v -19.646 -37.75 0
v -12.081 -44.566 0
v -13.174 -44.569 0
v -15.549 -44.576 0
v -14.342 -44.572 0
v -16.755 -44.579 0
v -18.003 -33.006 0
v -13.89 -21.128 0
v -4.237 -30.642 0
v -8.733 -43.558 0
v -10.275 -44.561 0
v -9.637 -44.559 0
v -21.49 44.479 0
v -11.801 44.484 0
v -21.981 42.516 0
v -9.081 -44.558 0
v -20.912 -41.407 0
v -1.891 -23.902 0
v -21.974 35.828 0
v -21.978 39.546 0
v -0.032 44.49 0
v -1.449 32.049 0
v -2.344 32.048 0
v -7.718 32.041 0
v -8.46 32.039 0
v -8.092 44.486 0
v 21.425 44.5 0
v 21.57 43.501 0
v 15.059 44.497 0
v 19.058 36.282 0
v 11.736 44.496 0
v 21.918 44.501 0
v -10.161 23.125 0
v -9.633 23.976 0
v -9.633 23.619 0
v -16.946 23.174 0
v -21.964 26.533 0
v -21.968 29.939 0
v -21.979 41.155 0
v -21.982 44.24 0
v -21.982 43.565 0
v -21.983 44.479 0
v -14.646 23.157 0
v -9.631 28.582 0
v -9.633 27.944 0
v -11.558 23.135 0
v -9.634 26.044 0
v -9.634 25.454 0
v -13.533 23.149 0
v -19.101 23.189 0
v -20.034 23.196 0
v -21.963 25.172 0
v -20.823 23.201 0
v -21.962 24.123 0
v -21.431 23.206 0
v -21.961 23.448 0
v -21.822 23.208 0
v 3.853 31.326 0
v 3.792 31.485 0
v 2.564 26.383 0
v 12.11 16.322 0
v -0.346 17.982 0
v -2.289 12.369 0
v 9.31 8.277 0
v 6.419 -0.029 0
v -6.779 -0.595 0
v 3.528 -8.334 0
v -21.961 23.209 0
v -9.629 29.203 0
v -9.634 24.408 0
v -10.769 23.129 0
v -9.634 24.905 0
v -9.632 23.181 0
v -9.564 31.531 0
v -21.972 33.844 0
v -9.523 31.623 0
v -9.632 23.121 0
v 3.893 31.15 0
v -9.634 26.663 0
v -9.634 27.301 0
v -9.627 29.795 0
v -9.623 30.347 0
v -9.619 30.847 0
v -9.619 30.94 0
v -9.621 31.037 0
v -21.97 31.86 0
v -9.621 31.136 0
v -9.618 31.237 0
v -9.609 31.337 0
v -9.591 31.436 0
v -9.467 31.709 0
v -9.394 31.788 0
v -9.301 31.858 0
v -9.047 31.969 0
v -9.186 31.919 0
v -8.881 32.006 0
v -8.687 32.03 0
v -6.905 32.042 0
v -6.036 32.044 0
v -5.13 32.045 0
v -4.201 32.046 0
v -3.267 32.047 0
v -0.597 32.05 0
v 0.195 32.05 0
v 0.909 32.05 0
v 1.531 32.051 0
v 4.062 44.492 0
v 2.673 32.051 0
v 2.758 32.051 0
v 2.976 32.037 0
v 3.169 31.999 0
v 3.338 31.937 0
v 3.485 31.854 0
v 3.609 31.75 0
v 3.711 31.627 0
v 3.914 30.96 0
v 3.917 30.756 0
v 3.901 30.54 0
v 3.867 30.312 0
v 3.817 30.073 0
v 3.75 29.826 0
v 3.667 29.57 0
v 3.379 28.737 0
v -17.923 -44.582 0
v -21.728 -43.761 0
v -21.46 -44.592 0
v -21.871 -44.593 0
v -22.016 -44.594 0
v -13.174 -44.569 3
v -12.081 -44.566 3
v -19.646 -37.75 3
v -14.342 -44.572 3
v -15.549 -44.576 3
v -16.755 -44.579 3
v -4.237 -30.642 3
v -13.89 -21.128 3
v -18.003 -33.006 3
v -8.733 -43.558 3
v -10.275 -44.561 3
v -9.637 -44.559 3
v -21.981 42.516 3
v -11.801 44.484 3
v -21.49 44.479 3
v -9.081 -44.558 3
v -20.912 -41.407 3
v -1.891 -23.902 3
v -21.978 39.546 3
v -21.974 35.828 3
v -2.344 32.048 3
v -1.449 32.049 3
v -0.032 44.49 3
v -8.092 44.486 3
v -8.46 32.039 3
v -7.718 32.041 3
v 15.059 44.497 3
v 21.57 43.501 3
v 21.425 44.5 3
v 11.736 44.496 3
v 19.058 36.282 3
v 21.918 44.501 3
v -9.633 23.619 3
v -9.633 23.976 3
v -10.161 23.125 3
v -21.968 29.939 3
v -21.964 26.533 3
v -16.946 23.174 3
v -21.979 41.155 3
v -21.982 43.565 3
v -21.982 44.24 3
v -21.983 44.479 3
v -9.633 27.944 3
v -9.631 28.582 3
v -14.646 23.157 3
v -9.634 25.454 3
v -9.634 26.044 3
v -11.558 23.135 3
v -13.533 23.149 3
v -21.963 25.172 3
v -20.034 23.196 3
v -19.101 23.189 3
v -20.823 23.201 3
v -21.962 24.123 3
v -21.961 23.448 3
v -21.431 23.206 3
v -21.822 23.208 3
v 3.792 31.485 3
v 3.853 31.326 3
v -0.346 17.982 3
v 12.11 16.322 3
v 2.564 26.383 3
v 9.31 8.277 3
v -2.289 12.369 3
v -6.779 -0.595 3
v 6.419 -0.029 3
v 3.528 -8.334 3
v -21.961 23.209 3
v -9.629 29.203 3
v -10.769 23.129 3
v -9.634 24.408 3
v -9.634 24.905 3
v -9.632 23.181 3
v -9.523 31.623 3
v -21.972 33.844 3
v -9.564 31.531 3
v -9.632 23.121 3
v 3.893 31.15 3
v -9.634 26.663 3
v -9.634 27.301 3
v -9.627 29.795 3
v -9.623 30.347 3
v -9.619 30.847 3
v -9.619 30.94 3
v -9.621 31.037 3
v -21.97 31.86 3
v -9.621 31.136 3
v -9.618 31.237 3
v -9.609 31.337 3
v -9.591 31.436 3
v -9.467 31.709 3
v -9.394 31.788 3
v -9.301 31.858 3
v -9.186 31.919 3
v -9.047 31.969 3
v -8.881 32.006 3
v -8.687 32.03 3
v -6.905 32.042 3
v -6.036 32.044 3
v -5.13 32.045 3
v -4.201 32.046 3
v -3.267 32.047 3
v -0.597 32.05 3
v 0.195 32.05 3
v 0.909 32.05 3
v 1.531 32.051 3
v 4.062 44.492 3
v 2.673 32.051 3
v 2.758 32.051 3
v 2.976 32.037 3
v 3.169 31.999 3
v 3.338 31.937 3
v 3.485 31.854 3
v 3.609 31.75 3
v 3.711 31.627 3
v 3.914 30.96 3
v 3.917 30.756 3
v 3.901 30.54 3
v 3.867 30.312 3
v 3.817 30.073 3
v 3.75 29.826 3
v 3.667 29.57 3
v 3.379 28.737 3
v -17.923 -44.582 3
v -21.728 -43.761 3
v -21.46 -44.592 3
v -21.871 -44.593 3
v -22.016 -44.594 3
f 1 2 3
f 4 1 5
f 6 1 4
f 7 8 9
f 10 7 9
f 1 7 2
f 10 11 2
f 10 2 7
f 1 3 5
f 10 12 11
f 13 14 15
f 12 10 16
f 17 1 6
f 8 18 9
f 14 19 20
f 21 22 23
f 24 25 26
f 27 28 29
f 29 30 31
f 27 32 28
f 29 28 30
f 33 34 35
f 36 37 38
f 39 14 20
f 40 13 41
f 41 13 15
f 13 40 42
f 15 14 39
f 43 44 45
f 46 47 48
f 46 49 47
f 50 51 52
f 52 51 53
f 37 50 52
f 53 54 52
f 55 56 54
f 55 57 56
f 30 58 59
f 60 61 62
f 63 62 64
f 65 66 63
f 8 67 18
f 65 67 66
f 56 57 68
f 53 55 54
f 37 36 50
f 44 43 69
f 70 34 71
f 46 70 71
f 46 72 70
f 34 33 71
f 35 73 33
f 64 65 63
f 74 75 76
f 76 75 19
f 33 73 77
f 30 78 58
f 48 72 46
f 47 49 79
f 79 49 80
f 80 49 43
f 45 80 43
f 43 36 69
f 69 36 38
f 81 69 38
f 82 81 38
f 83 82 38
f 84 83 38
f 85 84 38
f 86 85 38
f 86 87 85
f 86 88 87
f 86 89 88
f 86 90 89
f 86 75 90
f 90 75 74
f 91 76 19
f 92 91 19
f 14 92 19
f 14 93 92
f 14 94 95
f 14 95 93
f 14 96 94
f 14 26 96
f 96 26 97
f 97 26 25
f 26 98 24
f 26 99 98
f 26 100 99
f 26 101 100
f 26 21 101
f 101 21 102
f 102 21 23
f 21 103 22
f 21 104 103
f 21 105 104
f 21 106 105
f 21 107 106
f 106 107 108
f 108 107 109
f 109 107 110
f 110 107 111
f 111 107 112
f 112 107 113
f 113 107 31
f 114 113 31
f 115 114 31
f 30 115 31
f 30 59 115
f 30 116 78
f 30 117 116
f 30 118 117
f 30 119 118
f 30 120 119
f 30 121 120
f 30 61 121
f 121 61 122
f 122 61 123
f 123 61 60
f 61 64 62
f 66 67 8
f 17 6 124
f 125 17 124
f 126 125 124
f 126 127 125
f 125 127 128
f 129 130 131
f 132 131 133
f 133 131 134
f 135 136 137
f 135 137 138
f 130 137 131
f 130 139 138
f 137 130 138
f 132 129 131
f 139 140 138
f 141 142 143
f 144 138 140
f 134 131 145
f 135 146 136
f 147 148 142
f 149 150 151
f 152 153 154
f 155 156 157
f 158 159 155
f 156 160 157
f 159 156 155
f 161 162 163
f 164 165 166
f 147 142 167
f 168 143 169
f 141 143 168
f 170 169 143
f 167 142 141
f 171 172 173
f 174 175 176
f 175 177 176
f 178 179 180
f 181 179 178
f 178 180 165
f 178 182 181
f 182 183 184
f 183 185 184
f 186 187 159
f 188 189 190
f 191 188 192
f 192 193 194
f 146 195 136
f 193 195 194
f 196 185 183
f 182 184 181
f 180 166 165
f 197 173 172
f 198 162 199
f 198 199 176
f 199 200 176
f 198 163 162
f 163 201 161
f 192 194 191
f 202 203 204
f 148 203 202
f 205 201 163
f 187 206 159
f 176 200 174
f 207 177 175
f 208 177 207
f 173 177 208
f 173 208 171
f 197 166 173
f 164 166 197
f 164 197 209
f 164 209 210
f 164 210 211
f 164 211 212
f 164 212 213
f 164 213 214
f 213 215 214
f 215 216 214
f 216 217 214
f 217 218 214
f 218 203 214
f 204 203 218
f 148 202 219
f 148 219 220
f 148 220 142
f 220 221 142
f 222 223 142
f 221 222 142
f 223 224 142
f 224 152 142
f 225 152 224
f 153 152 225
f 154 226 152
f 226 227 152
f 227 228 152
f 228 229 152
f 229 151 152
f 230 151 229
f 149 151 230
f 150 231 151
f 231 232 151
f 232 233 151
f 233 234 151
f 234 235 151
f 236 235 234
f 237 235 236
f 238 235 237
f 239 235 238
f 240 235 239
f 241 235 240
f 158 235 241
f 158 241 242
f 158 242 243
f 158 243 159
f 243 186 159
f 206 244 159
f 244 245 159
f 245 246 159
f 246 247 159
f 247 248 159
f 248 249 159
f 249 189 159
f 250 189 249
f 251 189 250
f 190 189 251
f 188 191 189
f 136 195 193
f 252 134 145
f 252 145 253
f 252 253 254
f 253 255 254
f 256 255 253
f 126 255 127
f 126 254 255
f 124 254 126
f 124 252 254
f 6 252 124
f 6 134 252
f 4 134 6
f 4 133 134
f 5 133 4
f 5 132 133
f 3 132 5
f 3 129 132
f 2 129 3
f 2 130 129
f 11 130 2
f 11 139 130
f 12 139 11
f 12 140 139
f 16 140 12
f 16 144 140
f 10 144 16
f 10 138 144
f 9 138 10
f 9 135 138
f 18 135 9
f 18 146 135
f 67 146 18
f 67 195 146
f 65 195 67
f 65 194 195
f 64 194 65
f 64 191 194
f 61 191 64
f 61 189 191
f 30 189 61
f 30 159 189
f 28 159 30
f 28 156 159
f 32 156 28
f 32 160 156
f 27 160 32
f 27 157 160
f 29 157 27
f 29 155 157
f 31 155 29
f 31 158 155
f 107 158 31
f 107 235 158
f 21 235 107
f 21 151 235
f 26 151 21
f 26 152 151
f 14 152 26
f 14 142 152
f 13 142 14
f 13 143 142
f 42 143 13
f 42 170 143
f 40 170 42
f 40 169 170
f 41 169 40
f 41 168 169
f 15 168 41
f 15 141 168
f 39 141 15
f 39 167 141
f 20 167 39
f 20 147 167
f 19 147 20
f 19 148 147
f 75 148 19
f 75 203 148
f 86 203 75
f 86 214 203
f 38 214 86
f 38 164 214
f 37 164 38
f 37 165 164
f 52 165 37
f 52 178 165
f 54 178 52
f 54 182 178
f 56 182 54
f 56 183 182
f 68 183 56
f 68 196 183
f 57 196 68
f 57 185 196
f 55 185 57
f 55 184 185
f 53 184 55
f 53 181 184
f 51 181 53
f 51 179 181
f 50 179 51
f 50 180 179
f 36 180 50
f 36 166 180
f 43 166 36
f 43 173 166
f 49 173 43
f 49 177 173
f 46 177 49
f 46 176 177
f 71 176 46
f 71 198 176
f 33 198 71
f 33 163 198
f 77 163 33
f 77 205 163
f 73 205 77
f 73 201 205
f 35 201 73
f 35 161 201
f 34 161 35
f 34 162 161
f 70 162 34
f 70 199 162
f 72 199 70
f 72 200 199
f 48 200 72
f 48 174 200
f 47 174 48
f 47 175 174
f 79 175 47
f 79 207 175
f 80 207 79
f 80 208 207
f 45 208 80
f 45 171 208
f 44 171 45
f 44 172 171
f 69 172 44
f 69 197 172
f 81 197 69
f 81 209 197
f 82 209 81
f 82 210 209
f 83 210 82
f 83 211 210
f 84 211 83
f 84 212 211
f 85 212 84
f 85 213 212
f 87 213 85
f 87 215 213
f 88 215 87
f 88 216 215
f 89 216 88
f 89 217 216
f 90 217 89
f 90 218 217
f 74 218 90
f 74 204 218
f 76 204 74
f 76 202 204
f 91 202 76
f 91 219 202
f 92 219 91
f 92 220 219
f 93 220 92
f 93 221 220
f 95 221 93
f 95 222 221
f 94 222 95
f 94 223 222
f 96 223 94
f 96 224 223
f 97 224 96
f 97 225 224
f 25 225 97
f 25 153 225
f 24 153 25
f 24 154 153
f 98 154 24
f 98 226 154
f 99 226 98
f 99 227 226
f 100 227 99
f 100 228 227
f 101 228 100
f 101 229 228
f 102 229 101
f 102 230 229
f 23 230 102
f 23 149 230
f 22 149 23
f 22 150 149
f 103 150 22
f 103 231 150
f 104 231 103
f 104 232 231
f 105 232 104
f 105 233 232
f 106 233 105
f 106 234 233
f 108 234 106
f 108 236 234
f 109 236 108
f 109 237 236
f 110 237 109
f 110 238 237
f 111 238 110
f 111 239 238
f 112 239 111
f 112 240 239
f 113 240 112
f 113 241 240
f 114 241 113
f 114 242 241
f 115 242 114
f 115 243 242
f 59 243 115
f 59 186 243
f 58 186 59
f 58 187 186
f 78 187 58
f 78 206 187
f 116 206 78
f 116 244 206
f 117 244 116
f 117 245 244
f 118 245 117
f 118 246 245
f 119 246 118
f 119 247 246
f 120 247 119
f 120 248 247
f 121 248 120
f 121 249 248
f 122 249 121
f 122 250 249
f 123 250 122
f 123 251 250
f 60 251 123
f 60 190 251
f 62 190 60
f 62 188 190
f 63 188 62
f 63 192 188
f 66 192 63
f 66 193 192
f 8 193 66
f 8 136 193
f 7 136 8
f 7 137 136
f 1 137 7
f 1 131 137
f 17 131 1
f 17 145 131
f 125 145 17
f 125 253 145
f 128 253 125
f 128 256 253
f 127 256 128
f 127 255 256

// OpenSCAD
// Generated from 交通部公路局（原交通部公路總局）「新式號牌使用之英文字、數字字體」author trace
fudge = 0.1;

module glyph_2012_7(h = 3) {
  difference() {
    linear_extrude(height = h)
      polygon(points = [[-21.9828, 44.4788], [-21.9825, 44.2399], [-21.9818, 43.5649], [-21.9808, 42.5159], [-21.9793, 41.1554], [-21.9777, 39.5457], [-21.9758, 37.749], [-21.9738, 35.8277], [-21.9718, 33.8441], [-21.9697, 31.8604], [-21.9678, 29.9391], [-21.9659, 28.1424], [-21.9642, 26.5327], [-21.9628, 25.1722], [-21.9618, 24.1233], [-21.9611, 23.4482], [-21.9608, 23.2093], [-21.8223, 23.2083], [-21.431, 23.2056], [-20.823, 23.2012], [-20.0344, 23.1956], [-19.1013, 23.1889], [-18.0598, 23.1815], [-16.9461, 23.1736], [-15.7962, 23.1654], [-14.6464, 23.1572], [-13.5327, 23.1492], [-12.4912, 23.1418], [-11.5581, 23.1352], [-10.7694, 23.1295], [-10.1614, 23.1252], [-9.7701, 23.1224], [-9.6316, 23.1214], [-9.6318, 23.1806], [-9.6321, 23.3505], [-9.6326, 23.6195], [-9.6331, 23.976], [-9.6336, 24.4082], [-9.6341, 24.9047], [-9.6344, 25.4538], [-9.6345, 26.044], [-9.6343, 26.6635], [-9.6337, 27.3007], [-9.6327, 27.9442], [-9.6313, 28.5821], [-9.6293, 29.203], [-9.6266, 29.7952], [-9.6232, 30.3472], [-9.6191, 30.8471], [-9.6195, 30.9402], [-9.621, 31.037], [-9.6213, 31.1363], [-9.618, 31.2368], [-9.6088, 31.337], [-9.5915, 31.4357], [-9.5637, 31.5314], [-9.523, 31.6229], [-9.4673, 31.7088], [-9.3942, 31.7876], [-9.3014, 31.8582], [-9.1865, 31.9191], [-9.0473, 31.9689], [-8.8814, 32.0064], [-8.6866, 32.0301], [-8.4605, 32.0388], [-7.7183, 32.0406], [-6.9048, 32.0423], [-6.0365, 32.0438], [-5.1299, 32.0451], [-4.2014, 32.0463], [-3.2674, 32.0473], [-2.3444, 32.0482], [-1.4487, 32.049], [-0.5969, 32.0496], [0.1947, 32.0501], [0.9095, 32.0505], [1.5313, 32.0509], [2.0435, 32.0511], [2.4297, 32.0512], [2.6734, 32.0513], [2.7583, 32.0514], [2.9757, 32.037], [3.1689, 31.9986], [3.3384, 31.9372], [3.4849, 31.854], [3.609, 31.7501], [3.7112, 31.6266], [3.7923, 31.4848], [3.8527, 31.3257], [3.8932, 31.1505], [3.9143, 30.9604], [3.9166, 30.7565], [3.9007, 30.5399], [3.8672, 30.3119], [3.8168, 30.0734], [3.75, 29.8258], [3.6674, 29.57], [3.379, 28.7371], [2.5638, 26.3833], [1.2972, 22.7258], [-0.3456, 17.9819], [-2.2895, 12.3689], [-4.459, 6.1041], [-6.779, -0.5953], [-9.1743, -7.5119], [-11.5696, -14.4286], [-13.8897, -21.128], [-16.0592, -27.3928], [-18.003, -33.0058], [-19.6459, -37.7496], [-20.9125, -41.4071], [-21.7276, -43.761], [-22.0161, -44.5939], [-21.8708, -44.5935], [-21.4603, -44.5923], [-20.8224, -44.5905], [-19.995, -44.5882], [-19.016, -44.5855], [-17.9234, -44.5825], [-16.7549, -44.5792], [-15.5486, -44.5759], [-14.3422, -44.5725], [-13.1738, -44.5693], [-12.0812, -44.5662], [-11.1022, -44.5635], [-10.2748, -44.5612], [-9.6369, -44.5594], [-9.2264, -44.5583], [-9.0811, -44.5579], [-8.733, -43.5577], [-7.7491, -40.7311], [-6.2203, -36.3391], [-4.2374, -30.6425], [-1.8913, -23.9022], [0.7273, -16.3792], [3.5276, -8.3343], [6.4187, -0.0286], [9.3097, 8.2772], [12.11, 16.322], [14.7286, 23.8451], [17.0747, 30.5853], [19.0576, 36.282], [20.5864, 40.674], [21.5703, 43.5006], [21.9184, 44.5008], [21.4254, 44.5005], [20.032, 44.4998], [17.867, 44.4987], [15.0589, 44.4973], [11.7363, 44.4957], [8.0278, 44.4938], [4.0621, 44.4918], [-0.0322, 44.4898], [-4.1265, 44.4877], [-8.0922, 44.4857], [-11.8006, 44.4839], [-15.1232, 44.4822], [-17.9314, 44.4808], [-20.0964, 44.4797], [-21.4898, 44.479]]);
  }
}

glyph_2012_7();
